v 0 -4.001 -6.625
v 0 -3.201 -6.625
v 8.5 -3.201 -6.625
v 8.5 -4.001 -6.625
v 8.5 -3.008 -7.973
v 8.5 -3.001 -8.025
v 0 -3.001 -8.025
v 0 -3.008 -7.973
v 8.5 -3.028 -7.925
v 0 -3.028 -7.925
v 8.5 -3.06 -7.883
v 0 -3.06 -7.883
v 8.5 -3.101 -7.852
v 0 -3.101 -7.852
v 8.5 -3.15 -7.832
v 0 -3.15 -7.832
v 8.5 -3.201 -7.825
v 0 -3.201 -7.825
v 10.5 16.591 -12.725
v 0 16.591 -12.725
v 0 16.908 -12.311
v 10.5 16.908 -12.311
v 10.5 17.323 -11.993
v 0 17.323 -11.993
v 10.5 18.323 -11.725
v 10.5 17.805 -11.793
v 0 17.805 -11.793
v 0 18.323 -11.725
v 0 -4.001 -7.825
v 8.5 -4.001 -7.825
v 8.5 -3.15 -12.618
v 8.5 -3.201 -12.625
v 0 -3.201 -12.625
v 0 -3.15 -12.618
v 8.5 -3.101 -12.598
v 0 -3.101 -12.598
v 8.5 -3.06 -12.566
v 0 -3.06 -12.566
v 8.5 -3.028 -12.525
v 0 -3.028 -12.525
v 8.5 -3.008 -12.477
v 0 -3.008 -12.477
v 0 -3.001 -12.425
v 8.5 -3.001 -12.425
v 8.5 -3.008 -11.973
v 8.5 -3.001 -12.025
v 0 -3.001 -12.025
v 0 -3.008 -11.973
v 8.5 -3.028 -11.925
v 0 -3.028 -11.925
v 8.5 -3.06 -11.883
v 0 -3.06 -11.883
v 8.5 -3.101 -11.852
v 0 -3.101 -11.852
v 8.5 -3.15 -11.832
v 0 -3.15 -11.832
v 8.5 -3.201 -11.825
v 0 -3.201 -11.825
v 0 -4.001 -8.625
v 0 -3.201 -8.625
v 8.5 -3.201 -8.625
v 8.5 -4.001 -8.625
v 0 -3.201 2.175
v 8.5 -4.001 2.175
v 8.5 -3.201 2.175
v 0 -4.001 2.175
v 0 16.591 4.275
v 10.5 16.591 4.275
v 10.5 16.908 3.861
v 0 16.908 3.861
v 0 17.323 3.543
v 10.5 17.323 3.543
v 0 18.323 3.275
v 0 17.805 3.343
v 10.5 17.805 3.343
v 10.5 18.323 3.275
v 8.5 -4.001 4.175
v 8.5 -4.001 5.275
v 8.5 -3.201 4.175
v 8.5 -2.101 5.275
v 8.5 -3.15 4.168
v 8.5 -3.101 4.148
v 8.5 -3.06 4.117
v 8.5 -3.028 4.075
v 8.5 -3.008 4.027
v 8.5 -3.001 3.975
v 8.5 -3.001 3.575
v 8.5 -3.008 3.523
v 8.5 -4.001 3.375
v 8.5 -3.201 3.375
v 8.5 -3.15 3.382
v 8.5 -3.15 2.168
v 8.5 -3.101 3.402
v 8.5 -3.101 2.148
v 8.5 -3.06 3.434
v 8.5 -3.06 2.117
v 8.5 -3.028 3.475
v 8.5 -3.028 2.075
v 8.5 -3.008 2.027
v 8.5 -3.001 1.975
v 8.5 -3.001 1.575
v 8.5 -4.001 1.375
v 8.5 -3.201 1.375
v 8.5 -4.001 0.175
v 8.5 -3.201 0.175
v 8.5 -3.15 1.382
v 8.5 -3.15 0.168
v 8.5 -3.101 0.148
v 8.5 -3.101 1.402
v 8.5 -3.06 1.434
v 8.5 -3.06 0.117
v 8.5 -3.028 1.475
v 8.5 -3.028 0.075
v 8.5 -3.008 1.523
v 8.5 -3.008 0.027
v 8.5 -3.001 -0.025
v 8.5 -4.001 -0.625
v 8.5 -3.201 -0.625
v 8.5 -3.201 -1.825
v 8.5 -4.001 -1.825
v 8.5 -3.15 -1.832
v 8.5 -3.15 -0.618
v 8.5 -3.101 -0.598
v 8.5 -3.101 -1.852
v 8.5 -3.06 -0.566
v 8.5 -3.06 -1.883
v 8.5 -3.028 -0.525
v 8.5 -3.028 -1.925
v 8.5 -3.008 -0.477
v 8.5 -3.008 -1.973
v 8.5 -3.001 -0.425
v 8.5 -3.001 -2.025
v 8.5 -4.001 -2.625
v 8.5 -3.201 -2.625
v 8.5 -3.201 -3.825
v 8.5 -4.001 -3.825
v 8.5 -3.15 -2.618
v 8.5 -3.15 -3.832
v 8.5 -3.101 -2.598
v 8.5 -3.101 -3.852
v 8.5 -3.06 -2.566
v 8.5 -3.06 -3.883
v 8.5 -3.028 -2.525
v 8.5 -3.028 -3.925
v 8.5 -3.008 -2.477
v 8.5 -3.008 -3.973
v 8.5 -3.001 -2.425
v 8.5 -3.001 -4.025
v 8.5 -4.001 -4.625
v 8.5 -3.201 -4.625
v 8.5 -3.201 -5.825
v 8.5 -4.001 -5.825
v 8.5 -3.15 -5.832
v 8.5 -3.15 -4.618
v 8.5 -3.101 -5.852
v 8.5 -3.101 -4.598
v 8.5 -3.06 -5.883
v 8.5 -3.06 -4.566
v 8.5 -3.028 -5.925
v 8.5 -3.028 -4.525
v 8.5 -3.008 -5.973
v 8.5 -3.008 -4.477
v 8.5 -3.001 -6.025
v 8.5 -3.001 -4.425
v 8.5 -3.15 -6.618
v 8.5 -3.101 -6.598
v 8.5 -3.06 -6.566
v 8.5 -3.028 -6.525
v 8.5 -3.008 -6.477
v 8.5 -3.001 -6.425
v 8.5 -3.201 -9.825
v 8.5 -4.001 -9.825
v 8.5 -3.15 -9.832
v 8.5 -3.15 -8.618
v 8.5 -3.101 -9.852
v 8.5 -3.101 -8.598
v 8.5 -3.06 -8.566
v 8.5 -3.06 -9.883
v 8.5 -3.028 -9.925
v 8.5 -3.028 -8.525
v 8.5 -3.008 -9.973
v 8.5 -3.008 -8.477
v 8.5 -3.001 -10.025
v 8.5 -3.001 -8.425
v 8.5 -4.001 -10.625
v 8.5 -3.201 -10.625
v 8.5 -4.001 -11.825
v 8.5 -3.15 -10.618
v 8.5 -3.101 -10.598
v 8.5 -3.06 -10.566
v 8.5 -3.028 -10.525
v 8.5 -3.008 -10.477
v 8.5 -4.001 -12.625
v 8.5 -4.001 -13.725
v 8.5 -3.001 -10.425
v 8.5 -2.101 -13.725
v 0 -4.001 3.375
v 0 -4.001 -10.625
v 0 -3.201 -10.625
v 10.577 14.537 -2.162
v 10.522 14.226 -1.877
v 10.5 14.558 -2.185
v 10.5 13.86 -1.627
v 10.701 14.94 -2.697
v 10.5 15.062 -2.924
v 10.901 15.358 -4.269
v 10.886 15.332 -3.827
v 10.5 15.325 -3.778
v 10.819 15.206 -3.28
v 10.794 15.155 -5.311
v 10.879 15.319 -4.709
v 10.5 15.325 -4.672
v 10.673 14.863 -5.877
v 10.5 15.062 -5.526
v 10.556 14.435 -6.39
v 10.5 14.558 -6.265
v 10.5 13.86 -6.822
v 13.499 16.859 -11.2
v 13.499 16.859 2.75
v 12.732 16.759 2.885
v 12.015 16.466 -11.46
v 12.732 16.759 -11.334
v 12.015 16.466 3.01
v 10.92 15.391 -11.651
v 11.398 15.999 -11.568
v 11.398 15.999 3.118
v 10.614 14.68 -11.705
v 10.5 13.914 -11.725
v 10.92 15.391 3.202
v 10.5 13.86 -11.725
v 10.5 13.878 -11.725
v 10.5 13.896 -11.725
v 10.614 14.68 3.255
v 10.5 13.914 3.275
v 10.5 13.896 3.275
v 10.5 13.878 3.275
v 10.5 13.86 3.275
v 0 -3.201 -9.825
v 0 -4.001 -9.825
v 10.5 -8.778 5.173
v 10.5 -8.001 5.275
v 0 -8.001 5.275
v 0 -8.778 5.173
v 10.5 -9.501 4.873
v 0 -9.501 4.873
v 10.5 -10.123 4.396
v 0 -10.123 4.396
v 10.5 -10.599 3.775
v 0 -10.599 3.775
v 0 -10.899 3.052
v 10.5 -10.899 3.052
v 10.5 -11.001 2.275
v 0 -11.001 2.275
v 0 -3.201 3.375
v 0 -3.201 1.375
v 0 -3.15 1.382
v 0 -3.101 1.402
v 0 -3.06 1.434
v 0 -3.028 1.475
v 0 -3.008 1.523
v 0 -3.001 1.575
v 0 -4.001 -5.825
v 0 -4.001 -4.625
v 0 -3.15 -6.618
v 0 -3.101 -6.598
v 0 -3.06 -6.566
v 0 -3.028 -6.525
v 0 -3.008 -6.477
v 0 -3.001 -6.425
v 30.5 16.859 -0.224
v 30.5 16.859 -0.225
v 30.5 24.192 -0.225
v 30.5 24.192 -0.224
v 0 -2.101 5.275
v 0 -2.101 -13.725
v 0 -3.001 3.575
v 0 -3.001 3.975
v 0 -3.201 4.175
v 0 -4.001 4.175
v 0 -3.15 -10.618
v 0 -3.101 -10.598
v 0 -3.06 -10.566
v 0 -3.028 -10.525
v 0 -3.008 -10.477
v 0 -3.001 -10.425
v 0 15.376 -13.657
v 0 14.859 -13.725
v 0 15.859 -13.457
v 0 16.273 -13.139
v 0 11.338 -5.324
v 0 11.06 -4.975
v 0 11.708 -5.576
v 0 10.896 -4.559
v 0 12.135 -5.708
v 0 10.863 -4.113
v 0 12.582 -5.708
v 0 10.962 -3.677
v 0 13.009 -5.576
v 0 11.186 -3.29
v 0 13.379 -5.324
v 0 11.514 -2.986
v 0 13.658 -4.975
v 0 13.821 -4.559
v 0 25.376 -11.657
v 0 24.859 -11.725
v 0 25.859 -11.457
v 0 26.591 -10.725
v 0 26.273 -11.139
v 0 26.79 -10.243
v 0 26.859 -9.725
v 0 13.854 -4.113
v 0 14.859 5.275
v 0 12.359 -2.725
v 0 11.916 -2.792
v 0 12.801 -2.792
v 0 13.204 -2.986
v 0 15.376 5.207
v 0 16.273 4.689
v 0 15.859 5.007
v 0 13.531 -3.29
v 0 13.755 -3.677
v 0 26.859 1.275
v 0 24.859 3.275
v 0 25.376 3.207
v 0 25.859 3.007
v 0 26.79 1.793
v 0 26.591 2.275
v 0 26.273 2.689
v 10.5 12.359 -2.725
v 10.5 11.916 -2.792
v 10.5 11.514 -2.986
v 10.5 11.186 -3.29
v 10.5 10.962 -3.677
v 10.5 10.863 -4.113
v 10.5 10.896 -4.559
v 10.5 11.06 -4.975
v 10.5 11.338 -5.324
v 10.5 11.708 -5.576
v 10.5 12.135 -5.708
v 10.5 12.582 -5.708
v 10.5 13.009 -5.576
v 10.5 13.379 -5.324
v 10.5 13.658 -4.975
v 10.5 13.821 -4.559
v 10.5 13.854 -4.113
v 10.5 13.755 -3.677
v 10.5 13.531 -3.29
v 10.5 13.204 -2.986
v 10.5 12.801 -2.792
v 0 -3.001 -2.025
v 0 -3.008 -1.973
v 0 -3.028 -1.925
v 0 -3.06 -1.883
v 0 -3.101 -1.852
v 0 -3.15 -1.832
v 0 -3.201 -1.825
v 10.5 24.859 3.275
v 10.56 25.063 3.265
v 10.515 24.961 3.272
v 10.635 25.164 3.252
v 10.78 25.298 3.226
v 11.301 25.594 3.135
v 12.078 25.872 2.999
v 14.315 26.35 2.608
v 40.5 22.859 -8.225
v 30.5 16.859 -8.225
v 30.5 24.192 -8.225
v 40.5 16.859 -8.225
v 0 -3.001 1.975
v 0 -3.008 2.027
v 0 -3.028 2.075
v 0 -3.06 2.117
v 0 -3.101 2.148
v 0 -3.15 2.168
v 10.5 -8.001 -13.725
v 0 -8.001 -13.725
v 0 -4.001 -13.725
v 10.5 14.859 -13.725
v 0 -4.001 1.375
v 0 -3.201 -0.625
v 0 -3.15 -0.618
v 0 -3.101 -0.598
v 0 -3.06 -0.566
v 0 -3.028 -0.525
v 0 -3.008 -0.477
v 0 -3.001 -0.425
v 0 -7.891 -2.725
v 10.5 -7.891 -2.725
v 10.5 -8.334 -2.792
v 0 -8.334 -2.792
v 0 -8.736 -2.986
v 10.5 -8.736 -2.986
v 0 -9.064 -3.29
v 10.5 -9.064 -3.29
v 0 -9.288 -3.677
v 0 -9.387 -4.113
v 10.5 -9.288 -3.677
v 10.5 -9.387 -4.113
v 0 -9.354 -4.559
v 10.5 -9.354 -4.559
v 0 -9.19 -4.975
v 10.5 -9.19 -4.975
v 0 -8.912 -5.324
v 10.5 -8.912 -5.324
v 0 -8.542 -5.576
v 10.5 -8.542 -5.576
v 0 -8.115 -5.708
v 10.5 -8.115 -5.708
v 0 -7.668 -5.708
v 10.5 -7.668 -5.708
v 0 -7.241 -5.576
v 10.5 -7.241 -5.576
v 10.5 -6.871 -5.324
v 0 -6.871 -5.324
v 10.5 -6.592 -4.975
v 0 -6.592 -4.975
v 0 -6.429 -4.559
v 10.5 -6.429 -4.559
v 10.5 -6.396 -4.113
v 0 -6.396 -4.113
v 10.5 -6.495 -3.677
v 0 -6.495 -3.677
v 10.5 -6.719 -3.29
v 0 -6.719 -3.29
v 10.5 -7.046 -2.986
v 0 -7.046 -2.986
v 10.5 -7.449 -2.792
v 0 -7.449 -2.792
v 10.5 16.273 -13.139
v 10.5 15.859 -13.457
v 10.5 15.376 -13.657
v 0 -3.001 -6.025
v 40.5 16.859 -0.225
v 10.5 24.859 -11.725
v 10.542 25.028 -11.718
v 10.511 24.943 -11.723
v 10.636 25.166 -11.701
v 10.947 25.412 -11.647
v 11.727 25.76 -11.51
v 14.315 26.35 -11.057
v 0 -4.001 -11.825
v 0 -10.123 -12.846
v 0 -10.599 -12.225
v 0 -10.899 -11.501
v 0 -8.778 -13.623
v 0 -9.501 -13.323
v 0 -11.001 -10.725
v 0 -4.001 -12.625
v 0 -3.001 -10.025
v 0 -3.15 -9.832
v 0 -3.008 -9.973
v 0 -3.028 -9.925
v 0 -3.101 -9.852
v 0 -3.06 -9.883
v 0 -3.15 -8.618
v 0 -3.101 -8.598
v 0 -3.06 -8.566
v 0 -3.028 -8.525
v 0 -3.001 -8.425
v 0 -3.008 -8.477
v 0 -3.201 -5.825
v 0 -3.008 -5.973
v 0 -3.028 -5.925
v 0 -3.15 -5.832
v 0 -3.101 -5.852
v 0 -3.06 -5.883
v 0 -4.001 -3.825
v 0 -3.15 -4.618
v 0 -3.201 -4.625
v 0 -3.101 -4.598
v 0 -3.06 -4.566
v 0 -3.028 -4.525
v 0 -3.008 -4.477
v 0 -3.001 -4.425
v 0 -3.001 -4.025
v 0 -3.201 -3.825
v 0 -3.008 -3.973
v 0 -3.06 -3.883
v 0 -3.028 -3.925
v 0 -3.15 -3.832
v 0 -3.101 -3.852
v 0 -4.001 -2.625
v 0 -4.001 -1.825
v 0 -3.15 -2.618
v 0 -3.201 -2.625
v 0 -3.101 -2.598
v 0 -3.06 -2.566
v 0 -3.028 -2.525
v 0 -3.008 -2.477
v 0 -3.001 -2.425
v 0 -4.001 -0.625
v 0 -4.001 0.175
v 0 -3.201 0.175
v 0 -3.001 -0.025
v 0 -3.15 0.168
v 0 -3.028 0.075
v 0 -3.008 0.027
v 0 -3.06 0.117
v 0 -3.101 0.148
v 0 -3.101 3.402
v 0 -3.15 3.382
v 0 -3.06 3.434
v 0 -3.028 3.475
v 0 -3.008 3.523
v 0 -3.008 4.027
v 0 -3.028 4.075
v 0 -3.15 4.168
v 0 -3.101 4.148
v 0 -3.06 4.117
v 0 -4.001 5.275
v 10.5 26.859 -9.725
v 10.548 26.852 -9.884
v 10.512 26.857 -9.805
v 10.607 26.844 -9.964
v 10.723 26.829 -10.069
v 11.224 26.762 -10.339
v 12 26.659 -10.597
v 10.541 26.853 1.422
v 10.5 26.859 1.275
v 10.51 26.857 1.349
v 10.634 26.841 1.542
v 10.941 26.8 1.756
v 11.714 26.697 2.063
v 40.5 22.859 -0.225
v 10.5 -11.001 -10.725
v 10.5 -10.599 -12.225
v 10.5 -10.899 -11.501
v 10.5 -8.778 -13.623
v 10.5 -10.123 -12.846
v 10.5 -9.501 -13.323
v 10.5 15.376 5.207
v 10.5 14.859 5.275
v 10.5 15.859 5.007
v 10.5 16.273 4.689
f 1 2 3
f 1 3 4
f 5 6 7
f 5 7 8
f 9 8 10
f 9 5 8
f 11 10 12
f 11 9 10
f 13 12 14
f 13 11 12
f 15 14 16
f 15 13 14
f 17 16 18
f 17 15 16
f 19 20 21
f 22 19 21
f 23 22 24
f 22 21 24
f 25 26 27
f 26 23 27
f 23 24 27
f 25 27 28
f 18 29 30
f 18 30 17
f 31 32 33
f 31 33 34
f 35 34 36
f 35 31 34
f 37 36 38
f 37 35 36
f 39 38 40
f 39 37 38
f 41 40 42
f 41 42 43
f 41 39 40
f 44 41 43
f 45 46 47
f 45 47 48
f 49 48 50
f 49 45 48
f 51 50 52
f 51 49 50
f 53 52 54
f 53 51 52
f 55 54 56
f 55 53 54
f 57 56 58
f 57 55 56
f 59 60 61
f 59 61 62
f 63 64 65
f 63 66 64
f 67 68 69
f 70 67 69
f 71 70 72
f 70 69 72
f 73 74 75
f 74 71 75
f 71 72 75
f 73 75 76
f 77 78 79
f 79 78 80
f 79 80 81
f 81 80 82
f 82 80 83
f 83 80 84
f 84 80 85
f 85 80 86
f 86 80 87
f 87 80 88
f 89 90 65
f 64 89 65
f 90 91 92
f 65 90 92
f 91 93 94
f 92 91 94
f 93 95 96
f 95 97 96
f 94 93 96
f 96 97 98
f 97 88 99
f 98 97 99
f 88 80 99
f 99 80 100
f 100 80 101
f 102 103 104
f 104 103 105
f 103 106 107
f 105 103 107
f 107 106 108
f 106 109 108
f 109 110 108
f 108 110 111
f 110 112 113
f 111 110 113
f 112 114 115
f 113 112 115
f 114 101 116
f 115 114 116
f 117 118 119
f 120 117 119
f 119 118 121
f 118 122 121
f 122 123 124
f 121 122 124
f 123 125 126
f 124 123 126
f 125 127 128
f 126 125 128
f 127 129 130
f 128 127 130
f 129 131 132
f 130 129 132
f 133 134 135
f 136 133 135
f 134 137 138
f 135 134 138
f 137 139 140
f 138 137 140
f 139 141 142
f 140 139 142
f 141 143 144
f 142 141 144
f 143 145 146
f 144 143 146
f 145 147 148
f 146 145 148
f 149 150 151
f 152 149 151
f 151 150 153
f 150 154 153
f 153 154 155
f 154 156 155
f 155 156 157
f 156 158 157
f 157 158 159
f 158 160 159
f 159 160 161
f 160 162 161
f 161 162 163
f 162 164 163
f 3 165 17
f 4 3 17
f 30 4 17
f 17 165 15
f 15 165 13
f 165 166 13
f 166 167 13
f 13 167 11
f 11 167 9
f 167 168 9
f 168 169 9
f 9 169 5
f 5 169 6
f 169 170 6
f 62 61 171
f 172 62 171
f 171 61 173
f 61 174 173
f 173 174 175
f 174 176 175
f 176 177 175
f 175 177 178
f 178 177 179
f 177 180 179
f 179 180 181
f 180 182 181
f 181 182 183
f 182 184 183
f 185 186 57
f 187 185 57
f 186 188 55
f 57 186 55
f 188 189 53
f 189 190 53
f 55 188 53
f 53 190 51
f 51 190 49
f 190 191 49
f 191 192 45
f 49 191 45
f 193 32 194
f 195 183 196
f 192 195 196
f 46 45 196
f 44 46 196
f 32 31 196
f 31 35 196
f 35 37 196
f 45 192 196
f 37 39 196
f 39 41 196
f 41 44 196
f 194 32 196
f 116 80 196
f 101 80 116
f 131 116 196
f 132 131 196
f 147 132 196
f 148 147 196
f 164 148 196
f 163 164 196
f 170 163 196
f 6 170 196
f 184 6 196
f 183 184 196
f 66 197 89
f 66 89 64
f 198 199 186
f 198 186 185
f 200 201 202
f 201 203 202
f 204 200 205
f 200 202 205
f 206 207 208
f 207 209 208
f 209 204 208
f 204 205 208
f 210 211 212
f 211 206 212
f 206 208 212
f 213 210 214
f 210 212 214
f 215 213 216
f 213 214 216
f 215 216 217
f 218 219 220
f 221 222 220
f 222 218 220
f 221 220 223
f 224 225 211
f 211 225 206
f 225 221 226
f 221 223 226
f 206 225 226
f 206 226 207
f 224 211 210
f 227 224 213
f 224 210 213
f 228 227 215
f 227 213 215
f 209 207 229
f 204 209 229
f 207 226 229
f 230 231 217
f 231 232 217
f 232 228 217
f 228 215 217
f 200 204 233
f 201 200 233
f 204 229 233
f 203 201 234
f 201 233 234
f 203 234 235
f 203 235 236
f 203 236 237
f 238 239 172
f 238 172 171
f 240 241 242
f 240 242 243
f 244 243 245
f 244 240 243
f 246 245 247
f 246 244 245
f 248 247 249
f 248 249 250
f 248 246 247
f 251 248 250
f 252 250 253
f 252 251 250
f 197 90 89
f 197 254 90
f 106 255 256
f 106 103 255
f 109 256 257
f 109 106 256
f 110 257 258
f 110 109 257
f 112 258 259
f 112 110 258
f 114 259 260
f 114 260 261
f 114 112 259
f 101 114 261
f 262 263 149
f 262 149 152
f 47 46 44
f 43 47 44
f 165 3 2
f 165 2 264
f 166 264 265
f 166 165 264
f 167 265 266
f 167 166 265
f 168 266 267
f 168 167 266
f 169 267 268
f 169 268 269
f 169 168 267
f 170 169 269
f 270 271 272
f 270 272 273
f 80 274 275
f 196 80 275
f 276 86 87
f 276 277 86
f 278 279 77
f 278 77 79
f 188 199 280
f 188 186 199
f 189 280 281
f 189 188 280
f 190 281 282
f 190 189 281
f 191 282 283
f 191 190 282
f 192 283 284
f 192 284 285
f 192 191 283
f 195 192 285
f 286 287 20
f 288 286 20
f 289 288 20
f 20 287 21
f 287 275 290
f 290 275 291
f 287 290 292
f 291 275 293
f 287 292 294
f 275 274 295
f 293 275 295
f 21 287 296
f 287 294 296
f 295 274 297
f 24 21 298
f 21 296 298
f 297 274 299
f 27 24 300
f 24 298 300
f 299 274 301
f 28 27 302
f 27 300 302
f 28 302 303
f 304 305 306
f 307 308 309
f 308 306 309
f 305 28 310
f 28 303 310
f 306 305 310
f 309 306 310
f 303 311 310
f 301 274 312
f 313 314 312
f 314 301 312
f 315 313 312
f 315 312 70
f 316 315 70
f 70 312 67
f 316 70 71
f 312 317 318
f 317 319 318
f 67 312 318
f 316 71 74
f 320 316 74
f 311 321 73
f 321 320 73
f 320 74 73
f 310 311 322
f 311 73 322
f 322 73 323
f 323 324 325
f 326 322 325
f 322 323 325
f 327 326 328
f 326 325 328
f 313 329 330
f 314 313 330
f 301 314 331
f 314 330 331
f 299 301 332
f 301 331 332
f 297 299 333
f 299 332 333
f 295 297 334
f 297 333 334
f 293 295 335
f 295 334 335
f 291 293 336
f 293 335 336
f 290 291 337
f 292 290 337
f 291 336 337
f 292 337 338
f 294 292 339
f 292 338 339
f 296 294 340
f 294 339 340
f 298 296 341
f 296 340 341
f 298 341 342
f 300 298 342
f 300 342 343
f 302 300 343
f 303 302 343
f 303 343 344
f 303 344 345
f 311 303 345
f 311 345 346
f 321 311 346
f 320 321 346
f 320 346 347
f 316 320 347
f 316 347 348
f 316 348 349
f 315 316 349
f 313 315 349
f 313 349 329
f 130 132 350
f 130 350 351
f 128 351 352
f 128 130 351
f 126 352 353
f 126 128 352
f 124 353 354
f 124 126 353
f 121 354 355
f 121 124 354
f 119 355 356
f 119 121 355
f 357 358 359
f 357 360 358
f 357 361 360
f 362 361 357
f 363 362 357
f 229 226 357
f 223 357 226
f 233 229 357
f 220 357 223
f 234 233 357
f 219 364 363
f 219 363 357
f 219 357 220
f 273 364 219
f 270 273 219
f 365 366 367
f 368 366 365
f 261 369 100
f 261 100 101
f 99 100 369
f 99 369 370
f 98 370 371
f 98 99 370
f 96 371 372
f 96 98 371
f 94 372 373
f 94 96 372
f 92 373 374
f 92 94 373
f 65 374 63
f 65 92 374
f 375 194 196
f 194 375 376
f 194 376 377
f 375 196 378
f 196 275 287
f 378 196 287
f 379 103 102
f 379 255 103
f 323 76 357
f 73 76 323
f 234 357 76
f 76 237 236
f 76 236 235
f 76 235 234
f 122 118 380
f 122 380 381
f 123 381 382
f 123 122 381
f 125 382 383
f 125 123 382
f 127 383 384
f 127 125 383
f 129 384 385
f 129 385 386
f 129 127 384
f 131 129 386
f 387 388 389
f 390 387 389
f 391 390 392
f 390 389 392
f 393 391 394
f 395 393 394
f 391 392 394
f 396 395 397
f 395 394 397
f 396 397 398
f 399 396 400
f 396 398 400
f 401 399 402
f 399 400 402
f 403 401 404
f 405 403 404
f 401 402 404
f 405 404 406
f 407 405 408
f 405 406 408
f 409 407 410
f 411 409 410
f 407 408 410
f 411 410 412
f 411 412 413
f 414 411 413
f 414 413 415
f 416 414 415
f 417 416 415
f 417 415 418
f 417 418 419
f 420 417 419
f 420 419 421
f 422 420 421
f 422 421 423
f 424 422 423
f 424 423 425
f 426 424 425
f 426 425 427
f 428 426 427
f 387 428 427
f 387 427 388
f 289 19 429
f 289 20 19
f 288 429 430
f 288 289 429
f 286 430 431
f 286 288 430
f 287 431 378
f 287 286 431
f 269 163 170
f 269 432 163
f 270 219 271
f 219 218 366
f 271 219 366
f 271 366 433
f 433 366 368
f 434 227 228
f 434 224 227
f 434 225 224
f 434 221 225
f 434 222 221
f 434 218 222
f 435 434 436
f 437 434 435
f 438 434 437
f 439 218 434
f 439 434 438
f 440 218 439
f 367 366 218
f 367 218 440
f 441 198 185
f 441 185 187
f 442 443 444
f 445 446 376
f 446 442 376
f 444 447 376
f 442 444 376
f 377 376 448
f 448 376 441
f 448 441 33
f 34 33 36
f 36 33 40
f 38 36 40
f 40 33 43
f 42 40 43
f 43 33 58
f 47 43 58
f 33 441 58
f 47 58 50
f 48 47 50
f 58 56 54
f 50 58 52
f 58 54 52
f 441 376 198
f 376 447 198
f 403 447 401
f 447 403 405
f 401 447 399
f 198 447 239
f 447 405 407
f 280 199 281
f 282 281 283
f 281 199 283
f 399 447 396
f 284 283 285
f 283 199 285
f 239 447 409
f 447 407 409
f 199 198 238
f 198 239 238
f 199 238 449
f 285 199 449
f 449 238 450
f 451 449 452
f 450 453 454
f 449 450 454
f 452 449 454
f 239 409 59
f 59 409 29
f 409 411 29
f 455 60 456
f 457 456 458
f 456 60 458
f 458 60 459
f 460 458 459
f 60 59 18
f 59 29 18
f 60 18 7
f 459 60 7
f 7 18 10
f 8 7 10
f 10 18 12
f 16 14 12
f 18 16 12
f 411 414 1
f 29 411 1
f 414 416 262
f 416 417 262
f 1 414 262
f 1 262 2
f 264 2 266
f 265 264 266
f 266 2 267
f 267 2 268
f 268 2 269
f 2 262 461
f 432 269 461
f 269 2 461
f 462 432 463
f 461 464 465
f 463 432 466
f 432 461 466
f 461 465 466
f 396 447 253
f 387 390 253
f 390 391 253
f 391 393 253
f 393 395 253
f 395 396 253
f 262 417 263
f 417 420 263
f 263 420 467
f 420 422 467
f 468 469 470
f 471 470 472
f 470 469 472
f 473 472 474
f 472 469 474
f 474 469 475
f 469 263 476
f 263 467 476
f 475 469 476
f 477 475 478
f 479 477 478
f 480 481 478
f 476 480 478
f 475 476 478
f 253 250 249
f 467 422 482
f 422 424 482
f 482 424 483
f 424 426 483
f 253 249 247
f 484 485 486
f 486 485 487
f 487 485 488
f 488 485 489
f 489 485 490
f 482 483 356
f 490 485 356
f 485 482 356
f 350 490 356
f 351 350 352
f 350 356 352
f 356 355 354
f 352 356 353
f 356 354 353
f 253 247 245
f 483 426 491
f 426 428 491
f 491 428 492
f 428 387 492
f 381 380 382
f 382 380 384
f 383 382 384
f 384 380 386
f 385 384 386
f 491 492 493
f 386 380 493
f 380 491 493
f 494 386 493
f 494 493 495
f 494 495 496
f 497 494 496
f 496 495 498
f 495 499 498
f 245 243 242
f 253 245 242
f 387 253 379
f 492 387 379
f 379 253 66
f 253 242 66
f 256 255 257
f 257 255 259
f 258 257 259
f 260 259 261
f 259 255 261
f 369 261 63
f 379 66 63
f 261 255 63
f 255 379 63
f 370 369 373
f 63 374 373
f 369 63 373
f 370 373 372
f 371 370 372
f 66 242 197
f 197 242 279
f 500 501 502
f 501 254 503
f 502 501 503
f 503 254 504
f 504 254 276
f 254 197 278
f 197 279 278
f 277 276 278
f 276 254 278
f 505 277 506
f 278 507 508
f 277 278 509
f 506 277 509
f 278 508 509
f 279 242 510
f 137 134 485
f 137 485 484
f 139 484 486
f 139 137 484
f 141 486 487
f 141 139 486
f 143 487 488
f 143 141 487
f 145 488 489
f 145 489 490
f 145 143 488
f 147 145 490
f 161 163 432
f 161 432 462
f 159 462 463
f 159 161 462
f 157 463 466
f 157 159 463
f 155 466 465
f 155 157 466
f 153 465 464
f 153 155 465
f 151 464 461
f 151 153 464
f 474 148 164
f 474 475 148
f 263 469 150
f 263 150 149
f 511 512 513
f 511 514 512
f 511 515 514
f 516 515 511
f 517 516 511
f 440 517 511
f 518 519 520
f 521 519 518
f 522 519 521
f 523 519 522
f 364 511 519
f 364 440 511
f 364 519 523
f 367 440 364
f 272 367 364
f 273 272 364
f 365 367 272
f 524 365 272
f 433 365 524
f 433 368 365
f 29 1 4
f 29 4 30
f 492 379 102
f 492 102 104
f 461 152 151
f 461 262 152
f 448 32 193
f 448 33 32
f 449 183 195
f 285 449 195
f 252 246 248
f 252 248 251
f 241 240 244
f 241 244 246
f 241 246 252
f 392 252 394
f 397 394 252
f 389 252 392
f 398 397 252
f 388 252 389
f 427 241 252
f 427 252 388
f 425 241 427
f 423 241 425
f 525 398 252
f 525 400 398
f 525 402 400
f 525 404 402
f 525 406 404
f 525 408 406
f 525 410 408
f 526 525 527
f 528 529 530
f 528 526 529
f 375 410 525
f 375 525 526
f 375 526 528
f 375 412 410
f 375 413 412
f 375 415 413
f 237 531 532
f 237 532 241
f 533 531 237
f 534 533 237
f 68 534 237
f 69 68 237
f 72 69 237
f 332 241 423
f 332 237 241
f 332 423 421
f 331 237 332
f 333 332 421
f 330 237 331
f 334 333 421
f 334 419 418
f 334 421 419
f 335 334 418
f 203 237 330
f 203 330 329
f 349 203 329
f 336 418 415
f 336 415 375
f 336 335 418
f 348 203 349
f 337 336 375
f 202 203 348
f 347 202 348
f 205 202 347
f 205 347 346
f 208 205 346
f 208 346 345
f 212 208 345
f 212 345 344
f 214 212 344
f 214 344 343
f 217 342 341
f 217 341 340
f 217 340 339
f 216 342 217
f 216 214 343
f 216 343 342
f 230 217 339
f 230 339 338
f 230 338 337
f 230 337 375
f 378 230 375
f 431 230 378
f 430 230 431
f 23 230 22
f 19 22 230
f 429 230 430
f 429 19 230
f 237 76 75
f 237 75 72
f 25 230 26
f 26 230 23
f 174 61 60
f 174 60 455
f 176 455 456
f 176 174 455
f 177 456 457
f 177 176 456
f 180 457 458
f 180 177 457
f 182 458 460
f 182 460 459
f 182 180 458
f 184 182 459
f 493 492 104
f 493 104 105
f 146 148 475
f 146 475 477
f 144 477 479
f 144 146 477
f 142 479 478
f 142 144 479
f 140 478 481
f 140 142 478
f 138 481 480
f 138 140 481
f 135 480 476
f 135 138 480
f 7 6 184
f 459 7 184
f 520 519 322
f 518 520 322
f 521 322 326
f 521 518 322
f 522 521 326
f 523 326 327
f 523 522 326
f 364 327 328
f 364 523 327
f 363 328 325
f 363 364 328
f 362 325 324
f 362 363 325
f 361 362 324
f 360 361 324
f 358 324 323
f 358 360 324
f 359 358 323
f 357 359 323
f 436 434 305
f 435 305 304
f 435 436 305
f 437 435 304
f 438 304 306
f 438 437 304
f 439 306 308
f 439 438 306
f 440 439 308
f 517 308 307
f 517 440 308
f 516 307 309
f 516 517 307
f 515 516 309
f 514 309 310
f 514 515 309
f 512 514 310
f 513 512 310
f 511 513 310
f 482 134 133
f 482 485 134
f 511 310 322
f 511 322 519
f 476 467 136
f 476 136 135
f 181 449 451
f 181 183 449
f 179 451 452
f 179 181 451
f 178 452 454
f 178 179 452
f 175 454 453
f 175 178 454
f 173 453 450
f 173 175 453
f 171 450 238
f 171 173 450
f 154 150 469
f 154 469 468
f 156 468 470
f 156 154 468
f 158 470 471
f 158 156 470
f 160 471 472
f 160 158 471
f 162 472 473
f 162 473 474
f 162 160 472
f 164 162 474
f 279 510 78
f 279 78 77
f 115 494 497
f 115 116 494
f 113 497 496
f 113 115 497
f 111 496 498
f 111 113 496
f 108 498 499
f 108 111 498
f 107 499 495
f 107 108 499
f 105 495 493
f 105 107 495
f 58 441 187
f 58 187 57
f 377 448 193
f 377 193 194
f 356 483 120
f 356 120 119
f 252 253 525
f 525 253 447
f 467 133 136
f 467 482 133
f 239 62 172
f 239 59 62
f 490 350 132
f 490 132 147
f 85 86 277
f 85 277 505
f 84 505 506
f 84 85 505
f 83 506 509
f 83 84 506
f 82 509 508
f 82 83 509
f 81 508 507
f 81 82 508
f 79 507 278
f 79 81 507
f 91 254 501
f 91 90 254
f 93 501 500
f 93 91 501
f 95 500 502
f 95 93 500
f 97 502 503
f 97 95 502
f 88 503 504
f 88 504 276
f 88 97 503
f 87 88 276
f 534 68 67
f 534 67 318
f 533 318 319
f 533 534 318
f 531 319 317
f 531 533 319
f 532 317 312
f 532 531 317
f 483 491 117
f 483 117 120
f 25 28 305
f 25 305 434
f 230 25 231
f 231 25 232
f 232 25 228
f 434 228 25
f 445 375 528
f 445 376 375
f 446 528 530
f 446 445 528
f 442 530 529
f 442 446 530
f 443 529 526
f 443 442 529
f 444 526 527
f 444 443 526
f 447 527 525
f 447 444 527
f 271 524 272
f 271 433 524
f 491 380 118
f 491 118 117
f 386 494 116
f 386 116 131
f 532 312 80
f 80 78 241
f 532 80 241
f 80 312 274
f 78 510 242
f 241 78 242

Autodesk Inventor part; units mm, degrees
ref_plane "YZ Plane" through (0, 0, 0) normal (1, 0, 0) x (0, 1, 0)
ref_plane "XZ Plane" through (0, 0, 0) normal (0, 1, 0) x (-1, 0, 0)
ref_plane "XY Plane" through (0, 0, 0) normal (0, 0, 1) x (1, 0, 0)
sketch "Sketch1" plane through (0, 0, 0) normal (1, 0, 0) x (0, 1, 0)
  line L0 (16.8586, 5.2751) -> (-11.0014, 5.2751)
  line L1 (-11.0014, 5.2751) -> (-11.0014, -13.7249)
  line L2 (-11.0014, -13.7249) -> (16.8586, -13.7249)
  line L3 (16.8586, -13.7249) -> (16.8586, 5.2751)
  line L4 (-2.1014, 5.2751) -> (-2.1014, -13.7249)
  line L5 (-4.0014, 5.2751) -> (-4.0014, -13.7249)
  point P0 (0, 0)
  point P1 (12.3586, -4.2249)
  point P2 (-7.8914, -4.2249)
  dimension "d1" = 19
  dimension "d2" = 1.9
  dimension "d3" = 18.96
  dimension "d4" = 7
  dimension "d19" = 9.5
  dimension "d39" = 20.25
  dimension "d40" = 4.5
extrude "Extrusion1" add sketch "Sketch1" along normal blind 8.5 contours L3 L2 L4 L0 | L5 L2 L1 L0
sketch "Sketch2" plane through (8.5, 0, 0) normal (1, 0, 0) x (0, 0, -1)
  line L0 (-5.2751, 16.8586) -> (-5.2751, -2.1014) projected
  line L1 (-5.2751, -2.1014) -> (13.7249, -2.1014) projected
  line L2 (13.7249, -2.1014) -> (13.7249, 16.8586) projected
  line L3 (13.7249, 16.8586) -> (-5.2751, 16.8586) projected
  line L4 (13.7249, -11.0014) -> (13.7249, -4.0014) projected
  line L5 (13.7249, -4.0014) -> (-5.2751, -4.0014) projected
  line L6 (-5.2751, -4.0014) -> (-5.2751, -11.0014) projected
  line L7 (-5.2751, -11.0014) -> (13.7249, -11.0014) projected
  line L8 (-5.2751, -2.1014) -> (-5.2751, -4.0014)
  line L9 (13.7249, -2.1014) -> (13.7249, 16.8586) projected
  line L10 (13.7249, -11.0014) -> (13.7249, -4.0014) projected
  line L11 (13.7249, -2.1014) -> (13.7249, -4.0014)
  point P0 (0, 0)
extrude "Extrusion2" add sketch "Sketch2" along normal blind 2
sketch "Sketch3" plane through (0, 0, 0) normal (-1, 0, 0) x (0, 0, 1)
  line L0 (-13.7249, -11.0014) -> (-13.7249, -4.0014) projected
  line L1 (5.2751, -11.0014) -> (-13.7249, -11.0014) projected
  line L2 (5.2751, -4.0014) -> (5.2751, -11.0014) projected
  line L3 (-13.7249, -4.0014) -> (5.2751, -4.0014) projected
  line L4 (5.2751, 16.8586) -> (5.2751, -2.1014) projected
  line L5 (-13.7249, 16.8586) -> (5.2751, 16.8586) projected
  line L6 (-13.7249, -2.1014) -> (-13.7249, 16.8586) projected
  line L7 (5.2751, -2.1014) -> (-13.7249, -2.1014) projected
  line L8 (-12.6249, -4.0014) -> (-11.8249, -4.0014)
  line L9 (-11.8249, -4.0014) -> (-11.8249, -3.0014)
  line L10 (-11.8249, -3.0014) -> (-12.6249, -3.0014)
  line L11 (-12.6249, -3.0014) -> (-12.6249, -4.0014)
  point P0 (0, 0)
  dimension "d9" = 1
  dimension "d10" = 0.8
  dimension "d11" = 1.1
extrude "Extrusion3" add sketch "Sketch3" against normal up to surface (8.5 mm away) contours L11 L10 L9 L3
fillet "Fillet1" radius 0.2 2 edges at (4.25, -3.0014, -12.6249) (4.25, -3.0014, -11.8249)
pattern_linear "Rectangular Pattern1" count 9 spacing 2 along (0, 0, 1) of "Extrusion3", "Fillet1"
hole "Hole2" at (0, 12.3586, -4.2249) at (0, -7.8914, -4.2249) direction (1, 0, 0) diameter 3 end through all
fillet "Fillet3" radius 3 2 edges at (5.25, -11.0014, -13.7249) (5.25, -11.0014, 5.2751)
fillet "Fillet3" radius 2 2 edges at (5.25, 16.8586, 5.2751) (5.25, 16.8586, -13.7249)
sketch "Sketch4" plane through (0, 16.8586, 3.2751) normal (0, 1, 0) x (1, 0, 0)
  line L0 (0, 15) -> (10.5, 15) projected
  line L1 (0, 15) -> (0, 0) projected
  line L2 (10.5, 0) -> (0, 0) projected
  line L3 (10.5, 15) -> (10.5, 0) projected
  line L4 (10.5, 17) -> (10.5, 15) projected
  line L5 (10.5, 15) -> (30.5, 15)
  line L6 (30.5, 15) -> (30.5, 0)
  line L7 (30.5, 0) -> (10.5, 0)
  line L8 (30.5, 11.5) -> (40.5, 11.5)
  line L9 (40.5, 11.5) -> (40.5, 3.5)
  line L10 (40.5, 3.5) -> (30.5, 3.5)
  point P0 (0, 3.2751)
  dimension "d50" = 20
  dimension "d51" = 15
  dimension "d52" = 8
  dimension "d53" = 3.5
  dimension "d54" = 10
extrude "Extrusion4" add sketch "Sketch4" along normal blind 10
chamfer "Chamfer4" distance 20 distance2 3.5 1 edges at (30.5, 21.8586, 3.2751) measured on face at (13.6667, 23.5253, 3.2751)
chamfer "Chamfer5" distance 20 distance2 3.5 1 edges at (30.5, 21.8586, -11.7249) measured on face at (13.6667, 23.5253, -11.7249)
chamfer "Chamfer6" distance 30 distance2 4 1 edges at (40.5, 26.8586, -4.2249) measured on face at (17.167, 26.8586, -2.8915)
fillet "Fillet4" radius 2 4 edges at (5.25, 16.8586, 3.2751) (5.25, 26.8586, 3.2751) (5.25, 26.8586, -11.7249) (5.25, 16.8586, -11.7249)
fillet "Fillet4" radius 3 1 edges at (10.5, 16.8586, -4.2249)
sketch "Sketch5" plane through (10.5, -8.0014, 5.2751) normal (1, 0, 0) x (0, 0, -1)
  line L0 (2, 26.3241) -> (2, 21.86) projected
  arc A0 (1, 24.5921) -> (2, 26.3241) centre (0, 26.3241) ccw projected
  arc A1 (1, 24.5921) -> (0, 22.86) centre (2, 22.86) ccw projected
  line L1 (0, 22.86) -> (0, 0) projected
  arc A2 (0, 0) -> (3, -3) centre (3, 0) ccw projected
  line L2 (3, -3) -> (16, -3) projected
  arc A3 (16, -3) -> (19, 0) centre (16, 0) ccw projected
  line L3 (19, 0) -> (19, 22.86) projected
  arc A4 (19, 22.86) -> (18, 24.5921) centre (17, 22.86) ccw projected
  arc A5 (17, 26.3241) -> (18, 24.5921) centre (19, 26.3241) ccw projected
  line L4 (17, 21.86) -> (17, 26.3241) projected
  line L5 (9.5, 21.86) -> (17, 21.86) projected
  circle A6 centre (9.5, 20.36) radius 1.5 projected
  line L6 (2, 21.86) -> (9.5, 21.86) projected
  circle A7 centre (9.5, 0.11) radius 1.5 projected
  circle A8 centre (9.5, 20.36) radius 1.5 projected
  circle A9 centre (9.5, 20.36) radius 3
  point P0 (5.2751, 8.0014)
  dimension "d68" = 6
extrude "Extrusion5" cut sketch "Sketch5" along normal blind 10 contours A9 L5 L6 | L6 L5 A9
sketch "Sketch6" plane through (30.5, 16.8586, -0.2249) normal (0, 0, 1) x (1, 0, 0)
  point P0 (-30.5, -16.8586)
equation "\"d19\" = 0.5 * d1"
equation "\"d53\" = -0.5 * d52 + 0.5 * d51"
properties part number "3DP_PLA_X_axis_carriage_belt_mount" material "ABS Plastic"
